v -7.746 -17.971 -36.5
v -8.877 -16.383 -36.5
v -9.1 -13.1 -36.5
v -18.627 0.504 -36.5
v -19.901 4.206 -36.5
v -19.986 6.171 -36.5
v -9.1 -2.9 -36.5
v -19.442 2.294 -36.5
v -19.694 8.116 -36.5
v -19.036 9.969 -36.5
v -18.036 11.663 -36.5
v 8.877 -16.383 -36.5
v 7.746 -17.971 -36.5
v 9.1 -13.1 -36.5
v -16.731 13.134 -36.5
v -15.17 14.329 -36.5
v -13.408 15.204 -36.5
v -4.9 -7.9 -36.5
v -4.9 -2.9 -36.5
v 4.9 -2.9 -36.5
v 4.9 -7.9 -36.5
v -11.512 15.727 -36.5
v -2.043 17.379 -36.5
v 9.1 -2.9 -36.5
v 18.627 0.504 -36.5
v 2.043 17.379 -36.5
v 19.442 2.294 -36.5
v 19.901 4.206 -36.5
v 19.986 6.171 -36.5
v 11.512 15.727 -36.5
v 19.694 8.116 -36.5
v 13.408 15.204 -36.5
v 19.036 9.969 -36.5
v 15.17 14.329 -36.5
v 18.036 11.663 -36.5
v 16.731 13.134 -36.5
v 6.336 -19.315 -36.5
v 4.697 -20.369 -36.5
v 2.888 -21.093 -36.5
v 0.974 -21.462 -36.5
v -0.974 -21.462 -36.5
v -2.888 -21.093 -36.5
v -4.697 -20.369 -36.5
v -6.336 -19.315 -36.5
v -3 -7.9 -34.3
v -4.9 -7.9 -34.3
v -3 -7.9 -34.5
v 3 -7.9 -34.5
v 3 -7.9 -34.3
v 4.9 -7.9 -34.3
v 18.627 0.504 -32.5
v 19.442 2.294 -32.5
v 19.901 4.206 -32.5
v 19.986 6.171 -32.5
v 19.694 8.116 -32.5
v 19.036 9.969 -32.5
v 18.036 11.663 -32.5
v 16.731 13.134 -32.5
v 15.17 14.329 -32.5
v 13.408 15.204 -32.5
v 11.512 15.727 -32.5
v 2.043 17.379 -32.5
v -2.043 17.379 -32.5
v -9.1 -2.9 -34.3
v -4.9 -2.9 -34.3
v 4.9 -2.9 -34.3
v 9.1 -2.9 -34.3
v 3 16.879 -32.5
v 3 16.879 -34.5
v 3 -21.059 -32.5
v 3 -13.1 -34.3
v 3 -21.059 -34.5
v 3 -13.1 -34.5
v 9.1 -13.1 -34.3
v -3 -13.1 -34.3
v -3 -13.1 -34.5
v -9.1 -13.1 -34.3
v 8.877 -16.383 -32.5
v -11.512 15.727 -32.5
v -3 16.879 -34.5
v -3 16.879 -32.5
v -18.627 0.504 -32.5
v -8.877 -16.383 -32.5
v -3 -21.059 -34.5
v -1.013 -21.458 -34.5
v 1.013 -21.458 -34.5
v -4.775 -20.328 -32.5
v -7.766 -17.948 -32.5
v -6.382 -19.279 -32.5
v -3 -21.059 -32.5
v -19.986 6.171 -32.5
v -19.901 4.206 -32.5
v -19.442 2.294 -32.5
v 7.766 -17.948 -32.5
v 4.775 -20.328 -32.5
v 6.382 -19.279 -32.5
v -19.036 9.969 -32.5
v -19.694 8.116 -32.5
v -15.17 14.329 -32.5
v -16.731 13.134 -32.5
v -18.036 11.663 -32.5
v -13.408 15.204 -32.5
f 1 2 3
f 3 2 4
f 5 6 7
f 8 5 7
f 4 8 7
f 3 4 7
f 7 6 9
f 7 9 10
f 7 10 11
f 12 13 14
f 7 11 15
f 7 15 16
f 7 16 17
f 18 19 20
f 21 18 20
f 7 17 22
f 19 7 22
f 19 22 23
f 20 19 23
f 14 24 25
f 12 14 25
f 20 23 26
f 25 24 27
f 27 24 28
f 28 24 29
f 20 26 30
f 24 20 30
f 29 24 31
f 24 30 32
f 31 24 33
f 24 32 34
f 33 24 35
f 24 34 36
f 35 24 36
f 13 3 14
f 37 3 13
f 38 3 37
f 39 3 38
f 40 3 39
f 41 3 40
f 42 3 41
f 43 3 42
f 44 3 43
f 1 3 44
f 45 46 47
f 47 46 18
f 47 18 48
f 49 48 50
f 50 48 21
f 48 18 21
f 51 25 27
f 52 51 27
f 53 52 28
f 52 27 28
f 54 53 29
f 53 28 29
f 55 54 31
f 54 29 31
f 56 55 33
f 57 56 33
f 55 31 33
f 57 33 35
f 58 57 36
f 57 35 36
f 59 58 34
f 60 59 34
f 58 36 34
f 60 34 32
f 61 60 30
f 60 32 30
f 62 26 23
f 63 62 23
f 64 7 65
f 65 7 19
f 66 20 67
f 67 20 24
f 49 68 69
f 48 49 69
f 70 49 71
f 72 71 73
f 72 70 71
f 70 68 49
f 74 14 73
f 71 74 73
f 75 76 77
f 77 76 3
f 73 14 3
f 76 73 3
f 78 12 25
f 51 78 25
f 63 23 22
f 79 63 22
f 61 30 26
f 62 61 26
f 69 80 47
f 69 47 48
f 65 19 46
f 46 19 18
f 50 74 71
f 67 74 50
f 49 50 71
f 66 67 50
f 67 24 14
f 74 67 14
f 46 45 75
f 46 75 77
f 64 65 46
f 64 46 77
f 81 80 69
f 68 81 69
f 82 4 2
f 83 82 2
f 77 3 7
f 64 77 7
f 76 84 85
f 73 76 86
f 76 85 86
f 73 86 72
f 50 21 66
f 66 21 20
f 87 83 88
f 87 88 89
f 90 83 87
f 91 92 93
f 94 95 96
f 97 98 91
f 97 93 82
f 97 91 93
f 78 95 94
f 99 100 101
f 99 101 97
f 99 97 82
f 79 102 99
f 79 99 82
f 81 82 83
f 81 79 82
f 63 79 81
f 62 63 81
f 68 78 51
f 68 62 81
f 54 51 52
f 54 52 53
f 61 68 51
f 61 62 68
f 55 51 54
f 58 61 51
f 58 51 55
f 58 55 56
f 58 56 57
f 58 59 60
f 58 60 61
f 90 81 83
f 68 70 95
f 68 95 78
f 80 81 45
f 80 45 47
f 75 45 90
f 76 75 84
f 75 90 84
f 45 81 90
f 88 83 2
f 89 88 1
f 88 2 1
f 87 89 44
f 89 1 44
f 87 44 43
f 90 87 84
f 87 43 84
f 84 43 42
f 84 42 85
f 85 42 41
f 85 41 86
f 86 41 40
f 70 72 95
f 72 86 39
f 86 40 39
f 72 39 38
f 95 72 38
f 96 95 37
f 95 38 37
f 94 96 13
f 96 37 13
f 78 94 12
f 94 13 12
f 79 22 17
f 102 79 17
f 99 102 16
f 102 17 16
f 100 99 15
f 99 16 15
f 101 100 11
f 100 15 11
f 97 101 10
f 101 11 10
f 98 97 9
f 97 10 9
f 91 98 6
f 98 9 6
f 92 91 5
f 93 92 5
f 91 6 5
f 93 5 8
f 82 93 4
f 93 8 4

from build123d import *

# Parameters (mm, degrees)
BOSS_EXTRUDE1_START = -36.5
BOSS_EXTRUDE1_DEPTH = 4
CUT_EXTRUDE1_START  = -21.50833
SKETCH2_W           = 6
SKETCH2_H           = 3
CUT_EXTRUDE1_DEPTH  = 38.387495
CUT_EXTRUDE2_DEPTH  = 2.2


with BuildPart() as part:
    # Sketch1 → Boss-Extrude1 (new body)
    with BuildSketch(Plane.XY.offset(BOSS_EXTRUDE1_START)):
        with BuildLine():
            Line((-2.043305467, 17.379165125), (-11.512304293, 15.726530305))
            ThreePointArc((-11.512304293, 15.726530305), (-19.035877705, 9.969093149), (-18.626760389, 0.504165125))
            Line((-18.626760389, 0.504165125), (-8.876760389, -16.383330249))
            ThreePointArc((-8.876760389, -16.383330249), (0, -21.508330249), (8.876760389, -16.383330249))
            Line((8.876760389, -16.383330249), (18.626760389, 0.504165125))
            ThreePointArc((18.626760389, 0.504165125), (19.035877705, 9.969093149), (11.512304293, 15.726530305))
            Line((11.512304293, 15.726530305), (2.043305467, 17.379165125))
            Line((2.043305467, 17.379165125), (-2.043305467, 17.379165125))
        make_face()
    extrude(amount=BOSS_EXTRUDE1_DEPTH)

    # Sketch2 → Cut-Extrude1 (cut)
    with BuildSketch(Plane(origin=(0, 0, 0), x_dir=(1, 0, 0), z_dir=(0, 1, 0)).offset(CUT_EXTRUDE1_START)):
        with Locations((0, 33)):
            Rectangle(SKETCH2_W, SKETCH2_H)
    extrude(amount=CUT_EXTRUDE1_DEPTH, mode=Mode.SUBTRACT)

    # Sketch4 → Cut-Extrude2 (cut)
    with BuildSketch(Plane(origin=(0, 0, -36.5), x_dir=(-1, 0, 0), z_dir=(0, 0, -1))):
        Polygon((-9.1, -2.9), (-9.1, -13.1), (9.1, -13.1), (9.1, -2.9), (4.9, -2.9), (4.9, -7.9), (-4.9, -7.9), (-4.9, -2.9), align=None)
    extrude(amount=-CUT_EXTRUDE2_DEPTH, mode=Mode.SUBTRACT)


solid = part.part
